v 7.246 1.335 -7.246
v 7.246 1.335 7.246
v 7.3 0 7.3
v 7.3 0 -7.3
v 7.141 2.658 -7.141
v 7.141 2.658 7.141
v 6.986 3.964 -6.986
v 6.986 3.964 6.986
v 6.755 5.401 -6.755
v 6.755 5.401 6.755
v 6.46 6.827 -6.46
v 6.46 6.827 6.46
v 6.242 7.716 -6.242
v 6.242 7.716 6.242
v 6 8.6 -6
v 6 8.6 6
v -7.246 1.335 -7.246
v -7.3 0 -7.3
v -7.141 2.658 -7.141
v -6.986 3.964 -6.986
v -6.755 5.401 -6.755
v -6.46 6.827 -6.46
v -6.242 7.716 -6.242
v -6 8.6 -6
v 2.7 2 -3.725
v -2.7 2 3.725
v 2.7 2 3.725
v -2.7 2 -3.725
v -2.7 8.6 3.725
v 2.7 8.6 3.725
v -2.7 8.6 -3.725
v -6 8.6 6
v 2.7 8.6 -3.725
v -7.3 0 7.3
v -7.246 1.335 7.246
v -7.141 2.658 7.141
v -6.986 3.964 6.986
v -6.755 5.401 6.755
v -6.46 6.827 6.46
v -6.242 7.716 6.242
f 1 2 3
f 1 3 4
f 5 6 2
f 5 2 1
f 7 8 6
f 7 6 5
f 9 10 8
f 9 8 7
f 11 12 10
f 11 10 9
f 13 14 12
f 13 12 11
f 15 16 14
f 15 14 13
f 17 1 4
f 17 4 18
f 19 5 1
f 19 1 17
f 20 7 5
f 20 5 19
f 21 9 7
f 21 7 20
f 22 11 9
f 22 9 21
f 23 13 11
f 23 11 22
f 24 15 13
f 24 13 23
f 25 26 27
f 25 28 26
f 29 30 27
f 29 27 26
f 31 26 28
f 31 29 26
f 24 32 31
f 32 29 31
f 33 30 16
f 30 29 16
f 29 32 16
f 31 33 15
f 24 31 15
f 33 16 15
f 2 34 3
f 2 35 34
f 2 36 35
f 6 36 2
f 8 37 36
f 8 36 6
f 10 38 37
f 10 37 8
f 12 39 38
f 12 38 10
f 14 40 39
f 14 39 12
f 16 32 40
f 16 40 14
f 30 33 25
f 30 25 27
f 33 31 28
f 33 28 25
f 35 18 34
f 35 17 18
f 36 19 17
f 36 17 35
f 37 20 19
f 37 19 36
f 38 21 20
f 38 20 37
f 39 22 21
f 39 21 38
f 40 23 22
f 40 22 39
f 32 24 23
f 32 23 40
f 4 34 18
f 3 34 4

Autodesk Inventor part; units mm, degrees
ref_plane "YZ Plane" through (0, 0, 0) normal (1, 0, 0) x (0, 1, 0)
ref_plane "XZ Plane" through (0, 0, 0) normal (0, 1, 0) x (-1, 0, 0)
sketch "Base Loop" plane through (0, 0, 0) normal (0, 1, 0) x (-1, 0, 0)
  line L0 (-7.3, 7.3) -> (7.3, 7.3)
  line L1 (7.3, 7.3) -> (7.3, -7.3)
  line L2 (7.3, -7.3) -> (-7.3, -7.3)
  line L3 (-7.3, -7.3) -> (-7.3, 7.3)
  line L4 (-7.3, 7.3) -> (7.3, -7.3) construction
  line L5 (7.3, 7.3) -> (-7.3, -7.3) construction
  point P0 (0, 0)
  point P1 (0, 0)
  point P2 (0, 0)
  dimension "d0" = 14.6
  dimension "d1" = 14.6
ref_plane "Mid Plane" through (-7.3, 2, -7.3) normal (0, 1, 0) x (1, 0, 0)
ref_plane "Base Plane" through (-7.3, 0, -7.3) normal (0, 1, 0) x (1, 0, 0)
sketch "Mid Loop" plane through (-7.3, 2, -7.3) normal (0, 1, 0) x (1, 0, 0)
  line L0 (14.5, -14.5) -> (0.1, -14.5)
  line L1 (0.1, -14.5) -> (0.1, -0.1)
  line L2 (0.1, -0.1) -> (14.5, -0.1)
  line L3 (14.5, -0.1) -> (14.5, -14.5)
  line L4 (14.5, -14.5) -> (0.1, -0.1) construction
  line L5 (0.1, -14.5) -> (14.5, -0.1) construction
  point P0 (7.3, -7.3)
  dimension "d3" = 14.4
  dimension "d4" = 14.4
ref_plane "Top Plane" through (-7.3, 8.6, -7.3) normal (0, 1, 0) x (1, 0, 0)
sketch "Top Loop" plane through (-7.3, 8.6, -7.3) normal (0, 1, 0) x (1, 0, 0)
  line L0 (13.3, -13.3) -> (1.3, -13.3)
  line L1 (1.3, -13.3) -> (1.3, -1.3)
  line L2 (1.3, -1.3) -> (13.3, -1.3)
  line L3 (13.3, -1.3) -> (13.3, -13.3)
  line L4 (13.3, -13.3) -> (1.3, -1.3) construction
  line L5 (1.3, -13.3) -> (13.3, -1.3) construction
  point P0 (7.3, -7.3)
  dimension "d6" = 12
  dimension "d7" = 12
loft "Keyswitch Body" add profiles "Base Loop", "Mid Loop", "Top Loop"
sketch "Cut in profile" plane through (-6, 8.6, 6) normal (0, 1, 0) x (1, 0, 0)
  line L0 (8.7, 2.275) -> (3.3, 2.275)
  line L1 (3.3, 2.275) -> (3.3, 9.725)
  line L2 (3.3, 9.725) -> (8.7, 9.725)
  line L3 (8.7, 9.725) -> (8.7, 2.275)
  line L4 (8.7, 2.275) -> (3.3, 9.725) construction
  line L5 (3.3, 2.275) -> (8.7, 9.725) construction
  point P0 (6, 6)
  dimension "d17" = 7.45
  dimension "d18" = 5.4
extrude "Pole Cut in" cut sketch "Cut in profile" against normal blind 6.6
equation "\"d1\" = d0"
equation "\"d3\" = s_bwidth"
equation "\"d4\" = d3"
equation "\"d17\" = s_polebl"
equation "\"d18\" = s_polebw"
equation "\"k_width\" = 18"
equation "\"k_height\" = 16.5"
equation "\"k_taper1\" = 1.5"
equation "\"k_taper2\" = 0.5"
equation "\"k_radius\" = 6"
equation "\"k_wthick\" = 1.5"
equation "\"k_ribthick\" = 1.5"
equation "\"k_ribheight\" = 5"
equation "\"k_poleoff\" = 2.25"
equation "\"k_poledia\" = 5.3"
equation "\"k_cmxw\" = 1.1"
equation "\"k_cmxl\" = 4.15"
equation "\"s_bwidth\" = 14.4"
equation "\"s_poleh\" = 3.6"
equation "\"s_polebw\" = 5.4"
equation "\"s_polebl\" = 7.45"
equation "\"b_rshift\" = 49.5"
equation "\"b_ctrl\" = 22.5"
equation "\"b_space\" = 117"
equation "\"b_height\" = 77"
equation "\"b_width\" = 285"
equation "\"b_lshift\" = 40.5"
equation "\"b_tab\" = 27"
equation "\"b_pad\" = 1"
equation "\"b_caps\" = 31.5"
equation "\"k_staper\" = 1"
equation "\"k_ltaper\" = 1.5"
equation "\"k_lradius\" = 6"
equation "\"k_sradius\" = 4"
equation "\"k_height_t\" = 16"
equation "\"k_taper_wide\" = 1.5"
equation "\"k_taper_thin\" = 0.0001"
equation "\"k_height_low\" = 15"
equation "\"k_shortening\" = 4.5"
equation "\"k_cmxd\" = 4"
equation "\"k_taper_side\" = 0.5"
properties part number "keyswitch-base_cherrymx"
